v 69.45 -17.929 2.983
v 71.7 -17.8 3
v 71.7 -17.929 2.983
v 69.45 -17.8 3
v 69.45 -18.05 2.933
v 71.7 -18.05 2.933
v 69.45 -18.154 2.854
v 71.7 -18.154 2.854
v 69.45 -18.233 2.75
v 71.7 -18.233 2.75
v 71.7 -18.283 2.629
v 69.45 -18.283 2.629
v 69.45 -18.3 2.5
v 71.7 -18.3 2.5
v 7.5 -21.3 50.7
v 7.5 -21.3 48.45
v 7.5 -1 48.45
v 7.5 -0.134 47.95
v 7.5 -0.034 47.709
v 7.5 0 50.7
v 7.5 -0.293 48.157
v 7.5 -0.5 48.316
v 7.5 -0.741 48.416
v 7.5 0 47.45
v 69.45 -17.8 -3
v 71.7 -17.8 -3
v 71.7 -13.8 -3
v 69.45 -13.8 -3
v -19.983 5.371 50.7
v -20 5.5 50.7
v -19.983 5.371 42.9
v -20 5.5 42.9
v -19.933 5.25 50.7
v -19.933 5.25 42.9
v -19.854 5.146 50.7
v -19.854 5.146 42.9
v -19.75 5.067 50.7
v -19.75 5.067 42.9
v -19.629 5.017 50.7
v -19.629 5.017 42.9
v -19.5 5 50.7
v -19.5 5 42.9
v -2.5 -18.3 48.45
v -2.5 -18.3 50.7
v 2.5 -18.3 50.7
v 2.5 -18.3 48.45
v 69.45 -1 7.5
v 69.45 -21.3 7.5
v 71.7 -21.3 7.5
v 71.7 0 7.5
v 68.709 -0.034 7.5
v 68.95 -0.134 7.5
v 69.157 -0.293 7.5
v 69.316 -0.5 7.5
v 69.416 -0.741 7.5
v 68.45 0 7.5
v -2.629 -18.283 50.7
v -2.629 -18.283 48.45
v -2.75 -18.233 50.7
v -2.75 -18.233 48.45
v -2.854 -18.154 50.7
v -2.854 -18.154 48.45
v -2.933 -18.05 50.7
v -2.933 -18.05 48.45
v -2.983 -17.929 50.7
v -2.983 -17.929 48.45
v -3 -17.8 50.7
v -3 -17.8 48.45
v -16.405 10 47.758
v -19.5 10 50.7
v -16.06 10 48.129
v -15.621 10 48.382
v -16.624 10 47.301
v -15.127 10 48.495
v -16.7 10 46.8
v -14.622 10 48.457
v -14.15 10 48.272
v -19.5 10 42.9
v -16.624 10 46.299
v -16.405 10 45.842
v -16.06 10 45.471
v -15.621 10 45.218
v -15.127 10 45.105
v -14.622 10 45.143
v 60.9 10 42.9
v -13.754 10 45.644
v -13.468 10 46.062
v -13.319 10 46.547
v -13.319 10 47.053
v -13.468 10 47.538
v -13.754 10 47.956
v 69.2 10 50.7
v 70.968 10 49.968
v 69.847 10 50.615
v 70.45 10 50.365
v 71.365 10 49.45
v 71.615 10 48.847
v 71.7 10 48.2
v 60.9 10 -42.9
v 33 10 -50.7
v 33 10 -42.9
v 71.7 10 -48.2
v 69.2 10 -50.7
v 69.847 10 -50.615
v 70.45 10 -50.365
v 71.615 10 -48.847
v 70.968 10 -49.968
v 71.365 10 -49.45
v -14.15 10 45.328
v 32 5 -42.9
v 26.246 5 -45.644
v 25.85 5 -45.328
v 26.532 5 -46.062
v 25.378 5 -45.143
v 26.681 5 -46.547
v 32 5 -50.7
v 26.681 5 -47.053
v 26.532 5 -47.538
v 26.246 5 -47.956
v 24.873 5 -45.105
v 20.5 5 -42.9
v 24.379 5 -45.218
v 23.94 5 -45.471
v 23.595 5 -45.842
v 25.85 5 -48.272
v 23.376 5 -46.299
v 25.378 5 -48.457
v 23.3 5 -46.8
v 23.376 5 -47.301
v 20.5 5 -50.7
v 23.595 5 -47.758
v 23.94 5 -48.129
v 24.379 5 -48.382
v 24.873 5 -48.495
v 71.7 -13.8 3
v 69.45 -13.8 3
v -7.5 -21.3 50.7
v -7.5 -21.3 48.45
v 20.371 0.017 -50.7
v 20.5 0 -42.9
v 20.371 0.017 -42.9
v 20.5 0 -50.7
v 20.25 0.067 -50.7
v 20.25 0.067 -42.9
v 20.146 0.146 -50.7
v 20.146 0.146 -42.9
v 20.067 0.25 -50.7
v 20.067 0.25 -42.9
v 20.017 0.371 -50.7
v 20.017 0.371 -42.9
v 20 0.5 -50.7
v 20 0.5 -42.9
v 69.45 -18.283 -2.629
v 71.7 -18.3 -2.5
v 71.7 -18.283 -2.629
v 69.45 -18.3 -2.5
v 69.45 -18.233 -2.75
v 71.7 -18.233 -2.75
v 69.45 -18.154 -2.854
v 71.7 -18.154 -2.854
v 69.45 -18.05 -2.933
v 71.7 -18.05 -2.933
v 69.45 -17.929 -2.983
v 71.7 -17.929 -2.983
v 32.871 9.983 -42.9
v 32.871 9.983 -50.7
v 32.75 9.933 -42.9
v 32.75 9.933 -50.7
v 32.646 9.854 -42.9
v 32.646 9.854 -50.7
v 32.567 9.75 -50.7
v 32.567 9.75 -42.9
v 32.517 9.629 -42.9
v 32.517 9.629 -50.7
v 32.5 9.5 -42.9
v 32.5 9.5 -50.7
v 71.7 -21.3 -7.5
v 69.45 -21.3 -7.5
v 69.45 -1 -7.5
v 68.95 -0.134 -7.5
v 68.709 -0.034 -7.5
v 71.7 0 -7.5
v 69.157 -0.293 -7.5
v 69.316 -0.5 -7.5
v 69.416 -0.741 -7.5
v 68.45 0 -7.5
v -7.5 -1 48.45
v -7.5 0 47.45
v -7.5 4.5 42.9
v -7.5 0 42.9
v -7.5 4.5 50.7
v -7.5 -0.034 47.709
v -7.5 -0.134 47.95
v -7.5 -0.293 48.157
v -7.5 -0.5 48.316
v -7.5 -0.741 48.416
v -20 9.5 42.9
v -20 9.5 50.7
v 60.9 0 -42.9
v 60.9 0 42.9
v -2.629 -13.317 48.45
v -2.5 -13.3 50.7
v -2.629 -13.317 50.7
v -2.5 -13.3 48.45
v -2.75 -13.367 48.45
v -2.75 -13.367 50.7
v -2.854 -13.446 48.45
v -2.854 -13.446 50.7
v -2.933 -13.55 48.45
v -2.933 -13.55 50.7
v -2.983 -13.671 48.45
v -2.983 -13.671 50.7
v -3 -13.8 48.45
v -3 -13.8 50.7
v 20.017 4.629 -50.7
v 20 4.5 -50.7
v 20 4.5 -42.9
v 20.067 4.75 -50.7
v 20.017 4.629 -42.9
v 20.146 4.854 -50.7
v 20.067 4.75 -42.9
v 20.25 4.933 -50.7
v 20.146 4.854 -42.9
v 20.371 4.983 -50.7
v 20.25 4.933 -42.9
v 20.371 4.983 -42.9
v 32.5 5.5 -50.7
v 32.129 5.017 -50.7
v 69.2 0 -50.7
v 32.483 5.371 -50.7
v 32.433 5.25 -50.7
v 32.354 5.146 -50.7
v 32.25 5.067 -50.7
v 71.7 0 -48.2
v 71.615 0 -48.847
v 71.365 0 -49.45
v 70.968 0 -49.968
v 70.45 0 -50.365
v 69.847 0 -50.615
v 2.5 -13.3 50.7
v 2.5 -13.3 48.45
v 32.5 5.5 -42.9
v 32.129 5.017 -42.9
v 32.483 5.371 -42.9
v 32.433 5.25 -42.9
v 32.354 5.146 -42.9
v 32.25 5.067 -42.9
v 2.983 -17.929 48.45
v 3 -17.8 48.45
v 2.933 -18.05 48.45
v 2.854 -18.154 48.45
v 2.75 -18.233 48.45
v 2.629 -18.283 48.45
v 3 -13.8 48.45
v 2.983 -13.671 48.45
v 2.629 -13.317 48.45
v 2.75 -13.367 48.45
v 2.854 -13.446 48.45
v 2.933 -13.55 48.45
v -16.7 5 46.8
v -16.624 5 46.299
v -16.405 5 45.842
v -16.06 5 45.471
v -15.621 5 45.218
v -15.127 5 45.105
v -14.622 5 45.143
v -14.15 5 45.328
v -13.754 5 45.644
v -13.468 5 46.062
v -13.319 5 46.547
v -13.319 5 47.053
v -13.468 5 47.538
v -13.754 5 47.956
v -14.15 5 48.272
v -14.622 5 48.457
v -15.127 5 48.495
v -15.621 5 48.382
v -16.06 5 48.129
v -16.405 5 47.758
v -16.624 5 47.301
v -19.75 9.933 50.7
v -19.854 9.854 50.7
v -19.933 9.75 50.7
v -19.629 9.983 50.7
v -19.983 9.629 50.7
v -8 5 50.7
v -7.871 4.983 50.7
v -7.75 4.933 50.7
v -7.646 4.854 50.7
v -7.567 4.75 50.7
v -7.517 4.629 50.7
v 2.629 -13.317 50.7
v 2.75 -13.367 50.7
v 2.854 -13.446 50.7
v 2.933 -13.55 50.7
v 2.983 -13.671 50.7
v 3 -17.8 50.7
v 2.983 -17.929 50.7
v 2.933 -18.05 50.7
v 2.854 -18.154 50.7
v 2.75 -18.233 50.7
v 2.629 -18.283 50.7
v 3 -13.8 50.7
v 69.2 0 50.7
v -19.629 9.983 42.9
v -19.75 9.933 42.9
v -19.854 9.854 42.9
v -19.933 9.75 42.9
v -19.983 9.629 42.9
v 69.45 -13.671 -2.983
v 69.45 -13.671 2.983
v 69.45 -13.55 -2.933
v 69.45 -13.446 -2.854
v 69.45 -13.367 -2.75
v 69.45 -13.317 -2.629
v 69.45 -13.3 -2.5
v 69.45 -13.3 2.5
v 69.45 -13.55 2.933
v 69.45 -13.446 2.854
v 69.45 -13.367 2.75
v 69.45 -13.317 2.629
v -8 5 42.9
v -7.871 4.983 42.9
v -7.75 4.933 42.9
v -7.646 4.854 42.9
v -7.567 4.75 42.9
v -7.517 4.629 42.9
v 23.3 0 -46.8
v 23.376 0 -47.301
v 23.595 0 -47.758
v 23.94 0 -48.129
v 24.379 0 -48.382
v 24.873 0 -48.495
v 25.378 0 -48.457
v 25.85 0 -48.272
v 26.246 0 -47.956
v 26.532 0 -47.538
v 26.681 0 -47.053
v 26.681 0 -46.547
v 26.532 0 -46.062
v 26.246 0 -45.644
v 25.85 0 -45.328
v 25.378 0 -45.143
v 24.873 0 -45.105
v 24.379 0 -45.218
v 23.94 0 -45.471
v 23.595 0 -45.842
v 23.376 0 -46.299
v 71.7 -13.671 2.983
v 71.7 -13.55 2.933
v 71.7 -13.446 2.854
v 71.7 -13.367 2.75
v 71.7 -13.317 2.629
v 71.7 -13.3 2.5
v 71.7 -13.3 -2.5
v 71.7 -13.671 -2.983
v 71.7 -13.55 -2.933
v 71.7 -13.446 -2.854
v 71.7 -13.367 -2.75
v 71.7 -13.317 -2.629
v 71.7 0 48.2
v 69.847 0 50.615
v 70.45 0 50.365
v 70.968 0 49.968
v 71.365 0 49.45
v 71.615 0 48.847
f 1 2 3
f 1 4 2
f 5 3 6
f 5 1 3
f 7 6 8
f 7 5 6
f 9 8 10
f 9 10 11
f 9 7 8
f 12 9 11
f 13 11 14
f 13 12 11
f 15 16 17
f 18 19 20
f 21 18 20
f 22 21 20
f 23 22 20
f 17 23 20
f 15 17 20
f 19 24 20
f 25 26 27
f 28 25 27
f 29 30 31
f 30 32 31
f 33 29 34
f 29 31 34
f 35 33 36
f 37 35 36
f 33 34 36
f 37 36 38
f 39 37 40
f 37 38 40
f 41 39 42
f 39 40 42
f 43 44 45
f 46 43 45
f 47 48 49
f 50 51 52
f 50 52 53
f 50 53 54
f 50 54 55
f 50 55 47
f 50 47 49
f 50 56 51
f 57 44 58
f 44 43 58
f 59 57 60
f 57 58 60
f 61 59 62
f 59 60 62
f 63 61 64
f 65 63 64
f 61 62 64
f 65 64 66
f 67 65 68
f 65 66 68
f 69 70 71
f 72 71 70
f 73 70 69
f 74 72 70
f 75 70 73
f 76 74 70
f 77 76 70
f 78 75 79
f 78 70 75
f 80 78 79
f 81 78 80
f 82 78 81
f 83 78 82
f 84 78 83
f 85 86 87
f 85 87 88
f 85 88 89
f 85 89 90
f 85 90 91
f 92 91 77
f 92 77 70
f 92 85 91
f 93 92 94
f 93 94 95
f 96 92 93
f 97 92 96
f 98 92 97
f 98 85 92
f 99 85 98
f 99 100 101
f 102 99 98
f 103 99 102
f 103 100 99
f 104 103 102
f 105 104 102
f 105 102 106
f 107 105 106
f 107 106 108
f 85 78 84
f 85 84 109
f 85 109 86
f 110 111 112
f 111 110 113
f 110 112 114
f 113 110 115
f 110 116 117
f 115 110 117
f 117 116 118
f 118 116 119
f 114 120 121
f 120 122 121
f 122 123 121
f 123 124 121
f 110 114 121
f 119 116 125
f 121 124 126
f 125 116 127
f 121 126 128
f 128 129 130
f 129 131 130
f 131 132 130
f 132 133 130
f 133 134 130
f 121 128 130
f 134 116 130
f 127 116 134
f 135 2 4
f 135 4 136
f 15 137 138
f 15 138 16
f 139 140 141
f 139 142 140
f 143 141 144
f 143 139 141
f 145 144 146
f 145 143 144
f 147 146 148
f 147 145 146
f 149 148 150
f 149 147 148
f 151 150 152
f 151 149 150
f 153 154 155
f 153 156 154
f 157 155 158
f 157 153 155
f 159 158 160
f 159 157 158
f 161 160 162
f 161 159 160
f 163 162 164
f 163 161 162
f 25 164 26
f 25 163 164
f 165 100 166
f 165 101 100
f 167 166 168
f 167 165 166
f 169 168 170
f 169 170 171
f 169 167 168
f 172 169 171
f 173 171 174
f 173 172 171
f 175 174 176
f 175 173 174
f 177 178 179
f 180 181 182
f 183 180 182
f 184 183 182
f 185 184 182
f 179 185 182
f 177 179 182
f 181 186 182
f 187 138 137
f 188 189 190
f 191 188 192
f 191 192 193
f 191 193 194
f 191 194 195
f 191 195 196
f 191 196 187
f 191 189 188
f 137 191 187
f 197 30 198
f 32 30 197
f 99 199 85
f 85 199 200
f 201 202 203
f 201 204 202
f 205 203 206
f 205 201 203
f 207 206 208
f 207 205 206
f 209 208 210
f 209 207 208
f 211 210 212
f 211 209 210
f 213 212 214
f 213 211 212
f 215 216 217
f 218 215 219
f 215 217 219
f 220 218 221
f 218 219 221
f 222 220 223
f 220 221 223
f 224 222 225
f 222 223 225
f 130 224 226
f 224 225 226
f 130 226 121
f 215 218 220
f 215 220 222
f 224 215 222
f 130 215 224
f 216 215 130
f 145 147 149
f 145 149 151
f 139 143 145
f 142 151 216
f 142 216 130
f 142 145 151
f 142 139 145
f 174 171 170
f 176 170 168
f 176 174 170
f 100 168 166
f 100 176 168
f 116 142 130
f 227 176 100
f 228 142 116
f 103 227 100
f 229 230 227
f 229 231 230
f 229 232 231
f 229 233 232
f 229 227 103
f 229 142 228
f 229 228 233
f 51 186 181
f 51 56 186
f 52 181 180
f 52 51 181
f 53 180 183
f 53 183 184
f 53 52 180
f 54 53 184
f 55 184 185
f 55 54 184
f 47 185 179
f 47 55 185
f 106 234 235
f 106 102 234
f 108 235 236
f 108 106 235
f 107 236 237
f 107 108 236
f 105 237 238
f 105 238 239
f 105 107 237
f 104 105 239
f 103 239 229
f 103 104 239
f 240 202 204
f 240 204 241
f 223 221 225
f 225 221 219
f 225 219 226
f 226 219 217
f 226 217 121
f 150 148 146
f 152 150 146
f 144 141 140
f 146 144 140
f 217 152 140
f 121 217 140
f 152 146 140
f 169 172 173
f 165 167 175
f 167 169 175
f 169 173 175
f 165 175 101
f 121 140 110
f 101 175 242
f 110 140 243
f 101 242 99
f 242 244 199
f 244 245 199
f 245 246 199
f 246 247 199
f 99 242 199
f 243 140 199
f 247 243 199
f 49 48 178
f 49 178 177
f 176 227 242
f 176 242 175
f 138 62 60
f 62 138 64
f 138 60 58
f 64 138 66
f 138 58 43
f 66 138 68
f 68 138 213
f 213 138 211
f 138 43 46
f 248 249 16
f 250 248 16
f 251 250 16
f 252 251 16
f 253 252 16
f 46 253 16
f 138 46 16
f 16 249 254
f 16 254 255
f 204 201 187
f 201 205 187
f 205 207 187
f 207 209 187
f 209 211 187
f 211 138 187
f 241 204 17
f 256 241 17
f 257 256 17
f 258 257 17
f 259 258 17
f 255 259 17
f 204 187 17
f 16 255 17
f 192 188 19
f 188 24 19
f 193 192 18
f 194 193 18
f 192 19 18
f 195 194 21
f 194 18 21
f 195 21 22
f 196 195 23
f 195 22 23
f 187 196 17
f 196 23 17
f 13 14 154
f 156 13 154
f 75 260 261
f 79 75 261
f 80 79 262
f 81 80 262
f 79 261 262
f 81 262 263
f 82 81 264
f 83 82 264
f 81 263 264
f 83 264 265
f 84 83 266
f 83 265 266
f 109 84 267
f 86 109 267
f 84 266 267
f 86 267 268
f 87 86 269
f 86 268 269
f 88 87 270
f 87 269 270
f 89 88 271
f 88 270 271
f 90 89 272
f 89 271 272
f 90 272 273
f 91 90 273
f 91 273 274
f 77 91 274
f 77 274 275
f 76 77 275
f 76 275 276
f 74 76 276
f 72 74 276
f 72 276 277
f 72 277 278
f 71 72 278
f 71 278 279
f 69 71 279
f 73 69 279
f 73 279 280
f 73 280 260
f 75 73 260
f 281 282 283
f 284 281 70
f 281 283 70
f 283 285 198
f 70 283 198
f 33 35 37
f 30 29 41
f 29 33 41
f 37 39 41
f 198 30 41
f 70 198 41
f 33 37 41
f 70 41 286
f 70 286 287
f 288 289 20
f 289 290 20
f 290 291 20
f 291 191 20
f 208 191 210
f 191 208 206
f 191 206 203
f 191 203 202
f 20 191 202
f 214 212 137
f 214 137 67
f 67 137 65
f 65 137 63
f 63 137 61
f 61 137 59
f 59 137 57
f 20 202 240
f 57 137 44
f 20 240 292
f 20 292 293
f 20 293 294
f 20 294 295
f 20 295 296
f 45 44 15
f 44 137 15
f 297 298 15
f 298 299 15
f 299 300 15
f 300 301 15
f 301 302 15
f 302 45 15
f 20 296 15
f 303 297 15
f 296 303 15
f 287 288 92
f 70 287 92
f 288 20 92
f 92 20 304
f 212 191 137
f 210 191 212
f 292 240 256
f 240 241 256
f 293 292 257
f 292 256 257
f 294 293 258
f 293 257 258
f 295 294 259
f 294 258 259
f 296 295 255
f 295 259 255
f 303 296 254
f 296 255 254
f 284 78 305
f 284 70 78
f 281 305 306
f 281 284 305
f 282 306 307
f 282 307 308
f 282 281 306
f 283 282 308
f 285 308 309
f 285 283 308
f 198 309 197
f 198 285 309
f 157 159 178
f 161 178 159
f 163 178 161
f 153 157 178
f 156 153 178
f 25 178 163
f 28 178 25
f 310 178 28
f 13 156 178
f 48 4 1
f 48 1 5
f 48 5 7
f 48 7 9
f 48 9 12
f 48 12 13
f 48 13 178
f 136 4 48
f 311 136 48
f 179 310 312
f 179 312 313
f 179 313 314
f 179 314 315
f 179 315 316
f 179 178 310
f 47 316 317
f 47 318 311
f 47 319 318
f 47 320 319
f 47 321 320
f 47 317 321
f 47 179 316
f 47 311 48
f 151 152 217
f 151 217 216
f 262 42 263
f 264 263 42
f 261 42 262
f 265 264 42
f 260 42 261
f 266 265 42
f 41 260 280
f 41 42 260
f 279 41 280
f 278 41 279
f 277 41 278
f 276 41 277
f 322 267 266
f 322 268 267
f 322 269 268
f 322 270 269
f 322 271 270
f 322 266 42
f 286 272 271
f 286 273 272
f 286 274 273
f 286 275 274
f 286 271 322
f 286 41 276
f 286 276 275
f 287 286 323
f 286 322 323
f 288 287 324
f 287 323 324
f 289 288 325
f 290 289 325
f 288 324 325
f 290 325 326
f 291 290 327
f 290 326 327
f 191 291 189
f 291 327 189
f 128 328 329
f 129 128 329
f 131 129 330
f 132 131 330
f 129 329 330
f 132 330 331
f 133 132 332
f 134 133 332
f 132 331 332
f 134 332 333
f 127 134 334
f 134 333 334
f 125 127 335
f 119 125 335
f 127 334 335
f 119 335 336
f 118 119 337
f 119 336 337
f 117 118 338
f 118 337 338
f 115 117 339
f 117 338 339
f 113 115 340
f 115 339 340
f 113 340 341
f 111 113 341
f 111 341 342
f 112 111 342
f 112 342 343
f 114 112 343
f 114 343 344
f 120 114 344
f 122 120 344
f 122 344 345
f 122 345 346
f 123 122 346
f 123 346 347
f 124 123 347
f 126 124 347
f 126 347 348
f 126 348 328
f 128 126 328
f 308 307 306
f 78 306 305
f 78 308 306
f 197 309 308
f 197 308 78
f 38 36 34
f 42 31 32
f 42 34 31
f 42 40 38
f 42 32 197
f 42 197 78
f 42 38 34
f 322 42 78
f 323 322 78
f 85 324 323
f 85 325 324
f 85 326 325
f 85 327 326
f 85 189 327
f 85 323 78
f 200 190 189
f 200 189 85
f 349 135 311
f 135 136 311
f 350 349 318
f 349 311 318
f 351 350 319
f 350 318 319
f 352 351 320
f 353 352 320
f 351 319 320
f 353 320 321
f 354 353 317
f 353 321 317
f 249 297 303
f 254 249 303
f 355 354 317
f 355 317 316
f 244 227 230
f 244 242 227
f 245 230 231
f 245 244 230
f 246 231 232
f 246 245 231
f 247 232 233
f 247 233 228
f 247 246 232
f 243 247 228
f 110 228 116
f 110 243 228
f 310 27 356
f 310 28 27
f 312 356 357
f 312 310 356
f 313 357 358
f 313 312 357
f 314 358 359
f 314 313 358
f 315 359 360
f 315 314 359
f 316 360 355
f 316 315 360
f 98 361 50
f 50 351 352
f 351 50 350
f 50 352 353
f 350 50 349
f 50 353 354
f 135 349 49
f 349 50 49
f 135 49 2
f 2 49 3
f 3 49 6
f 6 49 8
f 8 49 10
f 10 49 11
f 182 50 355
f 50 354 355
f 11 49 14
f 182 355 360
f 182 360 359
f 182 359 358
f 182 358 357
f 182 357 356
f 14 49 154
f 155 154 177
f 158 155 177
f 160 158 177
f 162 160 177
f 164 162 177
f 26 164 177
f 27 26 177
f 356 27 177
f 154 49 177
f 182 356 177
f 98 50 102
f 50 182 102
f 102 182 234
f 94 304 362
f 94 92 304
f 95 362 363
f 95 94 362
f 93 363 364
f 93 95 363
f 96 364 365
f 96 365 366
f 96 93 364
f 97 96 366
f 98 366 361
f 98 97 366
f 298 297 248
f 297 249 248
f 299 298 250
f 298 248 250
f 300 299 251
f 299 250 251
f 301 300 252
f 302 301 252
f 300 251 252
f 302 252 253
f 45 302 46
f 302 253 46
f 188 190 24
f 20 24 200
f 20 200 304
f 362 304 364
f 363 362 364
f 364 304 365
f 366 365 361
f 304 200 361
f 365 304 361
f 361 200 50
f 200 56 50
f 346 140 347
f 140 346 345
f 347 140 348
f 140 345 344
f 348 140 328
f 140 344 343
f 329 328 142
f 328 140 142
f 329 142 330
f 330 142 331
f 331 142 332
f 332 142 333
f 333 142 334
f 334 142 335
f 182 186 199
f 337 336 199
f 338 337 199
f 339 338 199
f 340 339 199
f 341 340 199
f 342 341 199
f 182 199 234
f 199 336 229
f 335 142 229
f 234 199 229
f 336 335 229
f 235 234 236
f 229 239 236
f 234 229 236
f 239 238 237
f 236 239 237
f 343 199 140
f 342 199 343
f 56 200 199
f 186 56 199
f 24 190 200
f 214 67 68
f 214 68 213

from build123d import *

# Parameters (mm, degrees)
SKETCH1_W            = 143.4
SKETCH1_H            = 101.4
BOSS_EXTRUDE1_DEPTH  = 10
SKETCH2_W            = 121.8
SKETCH2_H            = 85.8
CUT_EXTRUDE1_DEPTH   = 89.382011744
CUT_EXTRUDE2_DEPTH   = 89.382011744
SKETCH4_W            = 2.25
SKETCH4_H            = 15
SKETCH4_W_2          = 15
SKETCH4_H_2          = 2.25
BOSS_EXTRUDE2_DEPTH  = 21.3
SKETCH5_W            = 6
SKETCH5_H            = 5
CUT_EXTRUDE3_DEPTH   = 107.925534836
SKETCH6_W            = 6
SKETCH6_H            = 5
CUT_EXTRUDE4_DEPTH   = 127.002142839
M3_CLEARANCE_HOLE1_D = 3.4
SKETCH10_W           = 12.5
SKETCH10_H           = 5
CUT_EXTRUDE5_DEPTH   = 127.002142839
CUT_EXTRUDE6_REACH   = 128.002
SKETCH11_W           = 12.5
SKETCH11_H           = 5
FILLET1_R            = 2.5
FILLET2_R            = 0.5
FILLET3_R            = 1
FILLET4_R            = 0.5


with BuildPart() as part:
    # Sketch1 → Boss-Extrude1 (new body)
    with BuildSketch(Plane(origin=(0, 0, 0), x_dir=(1, 0, 0), z_dir=(0, 1, 0))):
        Rectangle(SKETCH1_W, SKETCH1_H)
    extrude(amount=BOSS_EXTRUDE1_DEPTH)

    # Sketch2 → Cut-Extrude1 (cut, through all)
    with BuildSketch(Plane.XZ):
        Rectangle(SKETCH2_W, SKETCH2_H)
    extrude(amount=-CUT_EXTRUDE1_DEPTH, mode=Mode.SUBTRACT)

    # Sketch3 → Cut-Extrude2 (cut, through all)
    with BuildSketch(Plane.XZ):
        Polygon((-20, 50.7), (-20, 42.9), (-60.9, 42.9), (-60.9, -42.9), (20, -42.9), (20, -50.7), (-71.7, -50.7), (-71.7, 50.7), align=None)
    extrude(amount=-CUT_EXTRUDE2_DEPTH, mode=Mode.SUBTRACT)

    # Sketch4 → Boss-Extrude2 (add)
    with BuildSketch(Plane.XZ):
        with Locations((70.575, 0)):
            Rectangle(SKETCH4_W, SKETCH4_H)
        with Locations((0, 49.575)):
            Rectangle(SKETCH4_W_2, SKETCH4_H_2)
    extrude(amount=BOSS_EXTRUDE2_DEPTH)

    # Sketch5 → Cut-Extrude3 (cut, through all)
    with BuildSketch(Plane(origin=(71.7, 0, 0), x_dir=(0, 0, -1), z_dir=(1, 0, 0))):
        with Locations((0, -15.8)):
            Rectangle(SKETCH5_W, SKETCH5_H)
    extrude(amount=-CUT_EXTRUDE3_DEPTH, mode=Mode.SUBTRACT)

    # Sketch6 → Cut-Extrude4 (cut, through all)
    with BuildSketch(Plane.XY.offset(50.7)):
        with Locations((0, -15.8)):
            Rectangle(SKETCH6_W, SKETCH6_H)
    extrude(amount=-CUT_EXTRUDE4_DEPTH, mode=Mode.SUBTRACT)

    # M3 Clearance Hole1 (through all)
    with Locations(Plane(origin=(0, 10, 0), x_dir=(1, 0, 0), z_dir=(0, 1, 0))):
        with Locations((-15, -46.8), (25, 46.8)):
            Hole(M3_CLEARANCE_HOLE1_D / 2)

    # Sketch10 → Cut-Extrude5 (cut, through all)
    with BuildSketch(Plane.XY.offset(50.7)):
        with Locations((-13.75, 2.5)):
            Rectangle(SKETCH10_W, SKETCH10_H)
    extrude(amount=-CUT_EXTRUDE5_DEPTH, mode=Mode.SUBTRACT)

    # Sketch11 → Cut-Extrude6 (cut, up to next)
    with BuildSketch(Plane(origin=(0, 0, -50.7), x_dir=(-1, 0, 0), z_dir=(0, 0, -1)), mode=Mode.PRIVATE) as cut_extrude6_sk1:
        with Locations((-26.25, 7.5)):
            Rectangle(SKETCH11_W, SKETCH11_H)
    cut_extrude6_tool1 = extrude(cut_extrude6_sk1.sketch, amount=-CUT_EXTRUDE6_REACH, mode=Mode.PRIVATE) & part.part
    add(cut_extrude6_tool1.solids().sort_by_distance((26.25, 7.5, -50.7))[0], mode=Mode.SUBTRACT)

    # Fillet1
    fillet1_edges = [part.edges().sort_by_distance(p)[0] for p in [
        (71.7, 5, -50.7),
        (71.7, 5, 50.7),
    ]]
    fillet(fillet1_edges, radius=FILLET1_R)

    # Fillet2
    fillet2_edges = [part.edges().sort_by_distance(p)[0] for p in [
        (-7.5, 5, 46.8),
        (-20, 5, 46.8),
        (32.5, 10, -46.8),
        (32.5, 5, -46.8),
        (20, 5, -46.8),
        (-20, 10, 46.8),
        (20, 0, -46.8),
    ]]
    fillet(fillet2_edges, radius=FILLET2_R)

    # Fillet3
    fillet3_edges = [part.edges().sort_by_distance(p)[0] for p in [
        (69.45, 0, 0),
        (0, 0, 48.45),
    ]]
    fillet(fillet3_edges, radius=FILLET3_R)

    # Fillet4
    fillet4_edges = [part.edges().sort_by_distance(p)[0] for p in [
        (3, -13.3, 49.575),
        (3, -18.3, 49.575),
        (-3, -18.3, 49.575),
        (-3, -13.3, 49.575),
        (70.575, -13.3, -3),
        (70.575, -18.3, -3),
        (70.575, -18.3, 3),
        (70.575, -13.3, 3),
    ]]
    fillet(fillet4_edges, radius=FILLET4_R)


solid = part.part
